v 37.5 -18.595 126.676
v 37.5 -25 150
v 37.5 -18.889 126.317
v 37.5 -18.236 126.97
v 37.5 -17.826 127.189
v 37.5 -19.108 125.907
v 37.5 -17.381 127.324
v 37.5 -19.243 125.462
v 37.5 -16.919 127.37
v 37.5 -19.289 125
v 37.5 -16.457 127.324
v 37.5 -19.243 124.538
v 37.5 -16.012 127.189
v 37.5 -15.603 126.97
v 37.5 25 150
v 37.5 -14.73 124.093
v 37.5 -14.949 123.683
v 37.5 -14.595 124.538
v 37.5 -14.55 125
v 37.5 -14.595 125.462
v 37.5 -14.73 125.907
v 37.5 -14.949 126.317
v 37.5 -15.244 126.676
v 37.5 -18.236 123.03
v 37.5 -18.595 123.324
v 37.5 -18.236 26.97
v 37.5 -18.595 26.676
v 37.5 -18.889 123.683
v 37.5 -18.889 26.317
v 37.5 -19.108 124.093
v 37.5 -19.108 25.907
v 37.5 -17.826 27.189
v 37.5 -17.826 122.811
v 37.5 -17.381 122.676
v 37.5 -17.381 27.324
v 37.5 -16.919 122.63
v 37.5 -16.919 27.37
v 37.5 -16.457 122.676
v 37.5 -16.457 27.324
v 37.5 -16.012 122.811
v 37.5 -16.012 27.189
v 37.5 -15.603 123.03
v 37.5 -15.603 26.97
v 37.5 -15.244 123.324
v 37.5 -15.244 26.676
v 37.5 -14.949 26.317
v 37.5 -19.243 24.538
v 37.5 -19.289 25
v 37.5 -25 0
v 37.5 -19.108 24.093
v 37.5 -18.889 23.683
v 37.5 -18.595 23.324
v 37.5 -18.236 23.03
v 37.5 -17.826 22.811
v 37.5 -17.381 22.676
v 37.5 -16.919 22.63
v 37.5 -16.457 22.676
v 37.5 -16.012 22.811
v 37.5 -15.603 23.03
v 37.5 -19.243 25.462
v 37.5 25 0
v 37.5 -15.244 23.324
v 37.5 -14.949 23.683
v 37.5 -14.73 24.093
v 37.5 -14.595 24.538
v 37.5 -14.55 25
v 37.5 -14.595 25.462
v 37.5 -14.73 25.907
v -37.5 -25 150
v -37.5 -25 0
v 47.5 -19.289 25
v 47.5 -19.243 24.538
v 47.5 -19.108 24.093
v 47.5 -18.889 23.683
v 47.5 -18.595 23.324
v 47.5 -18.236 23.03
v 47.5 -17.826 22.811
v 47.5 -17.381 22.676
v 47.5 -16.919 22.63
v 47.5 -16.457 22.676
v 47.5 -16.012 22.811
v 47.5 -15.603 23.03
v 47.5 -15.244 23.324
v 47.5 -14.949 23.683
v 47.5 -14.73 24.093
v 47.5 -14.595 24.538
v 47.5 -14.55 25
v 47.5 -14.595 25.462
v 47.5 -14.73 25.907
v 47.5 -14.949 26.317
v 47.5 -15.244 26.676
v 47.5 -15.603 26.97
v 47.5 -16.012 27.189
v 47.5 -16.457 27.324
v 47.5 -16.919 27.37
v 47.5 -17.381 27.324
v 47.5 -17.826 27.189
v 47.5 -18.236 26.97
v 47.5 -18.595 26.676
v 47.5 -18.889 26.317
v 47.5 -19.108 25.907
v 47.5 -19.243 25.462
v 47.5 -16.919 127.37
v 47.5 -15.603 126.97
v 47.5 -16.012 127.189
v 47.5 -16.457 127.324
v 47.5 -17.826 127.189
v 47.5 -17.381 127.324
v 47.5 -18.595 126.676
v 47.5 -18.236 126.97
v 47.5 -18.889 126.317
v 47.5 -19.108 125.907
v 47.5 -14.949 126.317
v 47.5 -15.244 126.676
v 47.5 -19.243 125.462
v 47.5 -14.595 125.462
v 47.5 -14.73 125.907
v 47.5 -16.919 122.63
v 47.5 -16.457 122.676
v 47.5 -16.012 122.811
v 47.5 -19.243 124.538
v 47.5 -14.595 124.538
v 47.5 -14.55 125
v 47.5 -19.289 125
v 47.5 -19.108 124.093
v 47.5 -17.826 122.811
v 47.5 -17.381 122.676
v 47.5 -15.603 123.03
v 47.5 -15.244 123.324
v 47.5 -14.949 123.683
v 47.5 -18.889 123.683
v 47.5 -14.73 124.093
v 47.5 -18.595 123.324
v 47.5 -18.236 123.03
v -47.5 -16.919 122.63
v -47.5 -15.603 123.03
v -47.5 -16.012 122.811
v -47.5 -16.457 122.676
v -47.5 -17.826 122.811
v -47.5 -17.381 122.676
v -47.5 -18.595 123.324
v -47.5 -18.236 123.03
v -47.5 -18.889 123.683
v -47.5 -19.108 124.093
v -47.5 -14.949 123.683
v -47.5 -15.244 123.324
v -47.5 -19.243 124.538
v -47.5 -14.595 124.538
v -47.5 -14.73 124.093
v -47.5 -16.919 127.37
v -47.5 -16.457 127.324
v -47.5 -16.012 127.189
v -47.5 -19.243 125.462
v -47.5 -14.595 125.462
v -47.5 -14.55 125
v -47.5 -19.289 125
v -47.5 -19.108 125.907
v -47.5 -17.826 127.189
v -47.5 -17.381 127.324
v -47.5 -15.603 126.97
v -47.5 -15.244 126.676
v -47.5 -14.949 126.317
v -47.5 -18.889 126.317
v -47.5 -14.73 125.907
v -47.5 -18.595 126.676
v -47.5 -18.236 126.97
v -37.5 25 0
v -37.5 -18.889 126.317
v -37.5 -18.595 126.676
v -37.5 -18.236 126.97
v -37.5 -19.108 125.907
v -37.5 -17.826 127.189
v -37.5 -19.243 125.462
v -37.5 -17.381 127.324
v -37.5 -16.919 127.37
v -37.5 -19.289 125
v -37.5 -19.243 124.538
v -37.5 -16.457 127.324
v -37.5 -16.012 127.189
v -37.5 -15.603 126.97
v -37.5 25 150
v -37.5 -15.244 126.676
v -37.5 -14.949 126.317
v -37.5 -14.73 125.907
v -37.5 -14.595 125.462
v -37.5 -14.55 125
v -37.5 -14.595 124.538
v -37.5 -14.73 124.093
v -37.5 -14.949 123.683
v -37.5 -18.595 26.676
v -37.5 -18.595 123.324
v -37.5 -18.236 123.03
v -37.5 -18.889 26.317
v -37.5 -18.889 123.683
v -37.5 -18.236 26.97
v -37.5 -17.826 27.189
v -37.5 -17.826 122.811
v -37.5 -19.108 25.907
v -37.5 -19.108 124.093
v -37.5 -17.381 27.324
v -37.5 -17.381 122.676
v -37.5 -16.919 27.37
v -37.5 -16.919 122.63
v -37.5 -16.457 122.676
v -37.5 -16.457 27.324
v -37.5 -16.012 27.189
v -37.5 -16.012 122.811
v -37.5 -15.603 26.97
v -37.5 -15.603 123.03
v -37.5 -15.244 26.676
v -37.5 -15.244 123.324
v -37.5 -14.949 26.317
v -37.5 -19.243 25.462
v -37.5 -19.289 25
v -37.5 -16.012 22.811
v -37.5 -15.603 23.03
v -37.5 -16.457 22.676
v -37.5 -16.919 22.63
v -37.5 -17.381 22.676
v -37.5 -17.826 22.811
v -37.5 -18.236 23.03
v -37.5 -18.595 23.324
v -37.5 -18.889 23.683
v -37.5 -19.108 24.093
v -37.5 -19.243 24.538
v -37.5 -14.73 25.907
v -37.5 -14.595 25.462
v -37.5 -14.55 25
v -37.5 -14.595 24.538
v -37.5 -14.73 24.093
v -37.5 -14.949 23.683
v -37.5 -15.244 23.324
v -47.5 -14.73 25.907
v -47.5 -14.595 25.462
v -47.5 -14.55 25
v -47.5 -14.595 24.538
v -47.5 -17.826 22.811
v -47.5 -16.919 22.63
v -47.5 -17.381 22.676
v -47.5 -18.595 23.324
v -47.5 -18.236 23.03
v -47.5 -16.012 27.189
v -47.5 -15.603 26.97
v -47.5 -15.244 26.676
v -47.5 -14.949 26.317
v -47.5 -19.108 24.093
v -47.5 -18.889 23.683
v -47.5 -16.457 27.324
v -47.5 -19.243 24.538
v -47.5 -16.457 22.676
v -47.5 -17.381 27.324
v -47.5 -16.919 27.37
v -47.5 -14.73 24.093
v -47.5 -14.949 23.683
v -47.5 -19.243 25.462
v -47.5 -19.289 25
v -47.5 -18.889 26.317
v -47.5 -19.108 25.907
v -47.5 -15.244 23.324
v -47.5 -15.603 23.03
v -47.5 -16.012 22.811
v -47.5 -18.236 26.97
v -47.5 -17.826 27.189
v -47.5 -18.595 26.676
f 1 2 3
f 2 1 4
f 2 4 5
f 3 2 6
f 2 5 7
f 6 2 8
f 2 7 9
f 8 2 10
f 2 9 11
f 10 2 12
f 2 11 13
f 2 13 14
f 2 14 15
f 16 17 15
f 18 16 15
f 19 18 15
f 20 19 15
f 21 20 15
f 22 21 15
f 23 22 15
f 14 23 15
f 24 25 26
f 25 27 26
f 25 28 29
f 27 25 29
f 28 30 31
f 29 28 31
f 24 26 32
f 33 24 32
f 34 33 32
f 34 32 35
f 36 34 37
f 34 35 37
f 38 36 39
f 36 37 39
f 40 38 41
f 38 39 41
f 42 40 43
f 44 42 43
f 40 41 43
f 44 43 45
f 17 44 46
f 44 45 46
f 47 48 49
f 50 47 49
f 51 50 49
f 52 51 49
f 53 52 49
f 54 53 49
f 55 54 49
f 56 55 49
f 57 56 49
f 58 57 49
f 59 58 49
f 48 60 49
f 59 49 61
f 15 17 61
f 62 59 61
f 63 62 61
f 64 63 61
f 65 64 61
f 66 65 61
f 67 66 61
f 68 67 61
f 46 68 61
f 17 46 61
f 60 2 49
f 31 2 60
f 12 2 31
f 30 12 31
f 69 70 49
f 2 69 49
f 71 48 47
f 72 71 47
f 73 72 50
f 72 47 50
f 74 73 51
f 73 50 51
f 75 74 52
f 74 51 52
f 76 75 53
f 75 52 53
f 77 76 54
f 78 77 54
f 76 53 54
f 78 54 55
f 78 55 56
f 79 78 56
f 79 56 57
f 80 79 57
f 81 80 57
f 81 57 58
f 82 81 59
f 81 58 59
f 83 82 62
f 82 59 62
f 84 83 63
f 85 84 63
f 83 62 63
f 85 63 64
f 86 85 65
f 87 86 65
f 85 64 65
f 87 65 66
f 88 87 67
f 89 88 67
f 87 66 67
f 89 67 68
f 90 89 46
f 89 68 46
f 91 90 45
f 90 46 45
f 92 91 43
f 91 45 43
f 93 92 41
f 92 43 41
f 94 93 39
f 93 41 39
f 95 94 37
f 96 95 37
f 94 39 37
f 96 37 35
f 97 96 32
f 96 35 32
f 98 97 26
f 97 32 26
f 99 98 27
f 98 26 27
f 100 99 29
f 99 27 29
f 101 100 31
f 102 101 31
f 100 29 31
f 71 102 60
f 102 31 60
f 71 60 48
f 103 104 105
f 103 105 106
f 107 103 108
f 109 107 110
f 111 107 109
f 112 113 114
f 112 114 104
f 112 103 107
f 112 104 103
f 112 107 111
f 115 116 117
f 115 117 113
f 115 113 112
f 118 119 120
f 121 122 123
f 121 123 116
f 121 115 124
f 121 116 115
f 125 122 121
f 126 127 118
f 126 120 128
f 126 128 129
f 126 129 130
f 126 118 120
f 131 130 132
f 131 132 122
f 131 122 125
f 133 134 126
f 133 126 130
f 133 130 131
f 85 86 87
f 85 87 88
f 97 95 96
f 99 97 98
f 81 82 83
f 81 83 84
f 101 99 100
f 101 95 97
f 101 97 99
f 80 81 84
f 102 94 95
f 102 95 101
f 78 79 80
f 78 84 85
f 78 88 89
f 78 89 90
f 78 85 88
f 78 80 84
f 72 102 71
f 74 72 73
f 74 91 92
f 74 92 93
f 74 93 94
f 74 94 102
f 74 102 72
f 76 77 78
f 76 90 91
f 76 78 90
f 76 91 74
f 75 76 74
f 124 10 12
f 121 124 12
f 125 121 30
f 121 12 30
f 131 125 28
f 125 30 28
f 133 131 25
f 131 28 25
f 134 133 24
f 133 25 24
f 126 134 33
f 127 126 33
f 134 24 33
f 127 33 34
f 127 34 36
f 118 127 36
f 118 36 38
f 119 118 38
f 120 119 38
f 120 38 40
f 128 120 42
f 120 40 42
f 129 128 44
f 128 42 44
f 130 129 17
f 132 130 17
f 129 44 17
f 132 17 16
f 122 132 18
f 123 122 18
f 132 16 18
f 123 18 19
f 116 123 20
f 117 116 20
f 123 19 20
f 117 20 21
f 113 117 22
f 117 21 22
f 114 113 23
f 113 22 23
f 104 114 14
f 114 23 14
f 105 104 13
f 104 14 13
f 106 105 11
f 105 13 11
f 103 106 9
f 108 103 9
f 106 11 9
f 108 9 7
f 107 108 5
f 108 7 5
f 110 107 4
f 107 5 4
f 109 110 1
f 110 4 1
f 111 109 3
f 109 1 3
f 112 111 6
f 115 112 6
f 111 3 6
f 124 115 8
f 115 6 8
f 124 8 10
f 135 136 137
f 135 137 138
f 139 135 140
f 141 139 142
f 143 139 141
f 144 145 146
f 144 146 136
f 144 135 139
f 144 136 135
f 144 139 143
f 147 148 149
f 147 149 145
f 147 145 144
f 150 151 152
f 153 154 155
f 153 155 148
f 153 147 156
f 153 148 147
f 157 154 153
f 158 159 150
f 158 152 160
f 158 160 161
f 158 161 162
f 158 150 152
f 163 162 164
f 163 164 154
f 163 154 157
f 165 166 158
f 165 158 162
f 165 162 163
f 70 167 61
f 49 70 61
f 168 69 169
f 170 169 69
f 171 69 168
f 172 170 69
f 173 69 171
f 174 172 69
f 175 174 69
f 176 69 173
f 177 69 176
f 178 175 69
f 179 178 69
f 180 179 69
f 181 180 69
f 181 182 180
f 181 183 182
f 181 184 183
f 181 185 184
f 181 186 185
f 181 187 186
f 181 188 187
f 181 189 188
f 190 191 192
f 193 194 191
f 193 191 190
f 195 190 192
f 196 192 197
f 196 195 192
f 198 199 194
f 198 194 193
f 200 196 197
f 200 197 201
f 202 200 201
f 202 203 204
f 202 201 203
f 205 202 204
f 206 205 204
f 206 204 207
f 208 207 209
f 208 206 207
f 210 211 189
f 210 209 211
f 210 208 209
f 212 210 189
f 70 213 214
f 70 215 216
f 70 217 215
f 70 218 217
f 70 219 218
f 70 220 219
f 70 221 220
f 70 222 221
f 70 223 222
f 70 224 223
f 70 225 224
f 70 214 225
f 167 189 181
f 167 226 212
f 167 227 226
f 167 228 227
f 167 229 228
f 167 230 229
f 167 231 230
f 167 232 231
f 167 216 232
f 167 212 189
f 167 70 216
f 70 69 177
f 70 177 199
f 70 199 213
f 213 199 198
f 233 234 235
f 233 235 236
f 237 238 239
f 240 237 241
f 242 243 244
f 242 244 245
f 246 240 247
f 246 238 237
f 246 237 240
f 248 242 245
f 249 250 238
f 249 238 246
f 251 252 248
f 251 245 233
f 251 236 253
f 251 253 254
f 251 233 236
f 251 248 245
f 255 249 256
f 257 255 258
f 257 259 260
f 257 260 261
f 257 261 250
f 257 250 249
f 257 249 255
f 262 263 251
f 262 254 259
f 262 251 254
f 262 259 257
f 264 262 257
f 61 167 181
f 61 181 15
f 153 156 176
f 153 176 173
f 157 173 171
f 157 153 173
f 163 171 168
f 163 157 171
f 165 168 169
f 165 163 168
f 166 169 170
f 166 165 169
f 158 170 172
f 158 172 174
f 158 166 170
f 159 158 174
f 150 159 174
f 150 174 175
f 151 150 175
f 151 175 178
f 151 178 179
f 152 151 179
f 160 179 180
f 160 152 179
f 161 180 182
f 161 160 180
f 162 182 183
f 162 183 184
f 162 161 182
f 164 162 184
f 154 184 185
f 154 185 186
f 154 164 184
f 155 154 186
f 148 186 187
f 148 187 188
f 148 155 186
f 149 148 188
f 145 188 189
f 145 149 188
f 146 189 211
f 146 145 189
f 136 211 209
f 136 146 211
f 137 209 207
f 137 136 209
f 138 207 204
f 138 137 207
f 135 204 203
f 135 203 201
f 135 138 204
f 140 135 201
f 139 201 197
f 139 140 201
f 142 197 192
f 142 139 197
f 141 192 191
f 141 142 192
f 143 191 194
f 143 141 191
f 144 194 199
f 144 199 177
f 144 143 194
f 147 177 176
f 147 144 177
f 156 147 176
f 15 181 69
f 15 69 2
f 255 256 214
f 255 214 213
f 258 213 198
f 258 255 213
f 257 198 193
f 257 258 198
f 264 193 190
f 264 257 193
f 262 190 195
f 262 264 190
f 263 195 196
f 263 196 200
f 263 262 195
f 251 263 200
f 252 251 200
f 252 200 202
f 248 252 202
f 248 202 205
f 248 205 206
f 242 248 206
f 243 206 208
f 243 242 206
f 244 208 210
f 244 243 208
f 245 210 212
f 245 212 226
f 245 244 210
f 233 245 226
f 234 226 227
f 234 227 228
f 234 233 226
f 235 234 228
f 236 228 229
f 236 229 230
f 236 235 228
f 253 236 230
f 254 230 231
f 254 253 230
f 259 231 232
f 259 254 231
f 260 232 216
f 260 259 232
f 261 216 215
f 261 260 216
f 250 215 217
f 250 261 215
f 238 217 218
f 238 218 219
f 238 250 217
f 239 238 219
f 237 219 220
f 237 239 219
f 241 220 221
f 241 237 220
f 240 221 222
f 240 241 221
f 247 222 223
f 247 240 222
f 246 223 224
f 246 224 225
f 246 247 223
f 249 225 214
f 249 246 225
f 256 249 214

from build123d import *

# Parameters (mm, degrees)
SKETCH1_W           = 75
SKETCH1_H           = 50
BOSS_EXTRUDE1_DEPTH = 150
SKETCH2_R           = 2.369647205
BOSS_EXTRUDE2_DEPTH = 10
BOSS_EXTRUDE3_START = 10
SKETCH3_R           = 2.369647205
BOSS_EXTRUDE3_DEPTH = 10


with BuildPart() as part:
    # Sketch1 → Boss-Extrude1 (new body)
    with BuildSketch(Plane.XY):
        Rectangle(SKETCH1_W, SKETCH1_H)
    extrude(amount=BOSS_EXTRUDE1_DEPTH)

    # Sketch2 → Boss-Extrude2 (add)
    with BuildSketch(Plane(origin=(37.5, 0, 0), x_dir=(0, 0, -1), z_dir=(1, 0, 0))):
        with Locations(Location((-125, -16.919154578, 0), (0, 0, 270))):
            Circle(SKETCH2_R)
        with Locations(Location((-25, -16.919154578, 0), (0, 0, 270))):
            Circle(SKETCH2_R)
    extrude(amount=BOSS_EXTRUDE2_DEPTH)

    # Sketch3 → Boss-Extrude3 (add)
    with BuildSketch(Plane.ZY.offset(37.5).offset(BOSS_EXTRUDE3_START)):
        with Locations(Location((25, -16.919154578, 0), (0, 0, 270))):
            Circle(SKETCH3_R)
        with Locations(Location((125, -16.919154578, 0), (0, 0, 270))):
            Circle(SKETCH3_R)
    extrude(amount=-BOSS_EXTRUDE3_DEPTH)


solid = part.part
